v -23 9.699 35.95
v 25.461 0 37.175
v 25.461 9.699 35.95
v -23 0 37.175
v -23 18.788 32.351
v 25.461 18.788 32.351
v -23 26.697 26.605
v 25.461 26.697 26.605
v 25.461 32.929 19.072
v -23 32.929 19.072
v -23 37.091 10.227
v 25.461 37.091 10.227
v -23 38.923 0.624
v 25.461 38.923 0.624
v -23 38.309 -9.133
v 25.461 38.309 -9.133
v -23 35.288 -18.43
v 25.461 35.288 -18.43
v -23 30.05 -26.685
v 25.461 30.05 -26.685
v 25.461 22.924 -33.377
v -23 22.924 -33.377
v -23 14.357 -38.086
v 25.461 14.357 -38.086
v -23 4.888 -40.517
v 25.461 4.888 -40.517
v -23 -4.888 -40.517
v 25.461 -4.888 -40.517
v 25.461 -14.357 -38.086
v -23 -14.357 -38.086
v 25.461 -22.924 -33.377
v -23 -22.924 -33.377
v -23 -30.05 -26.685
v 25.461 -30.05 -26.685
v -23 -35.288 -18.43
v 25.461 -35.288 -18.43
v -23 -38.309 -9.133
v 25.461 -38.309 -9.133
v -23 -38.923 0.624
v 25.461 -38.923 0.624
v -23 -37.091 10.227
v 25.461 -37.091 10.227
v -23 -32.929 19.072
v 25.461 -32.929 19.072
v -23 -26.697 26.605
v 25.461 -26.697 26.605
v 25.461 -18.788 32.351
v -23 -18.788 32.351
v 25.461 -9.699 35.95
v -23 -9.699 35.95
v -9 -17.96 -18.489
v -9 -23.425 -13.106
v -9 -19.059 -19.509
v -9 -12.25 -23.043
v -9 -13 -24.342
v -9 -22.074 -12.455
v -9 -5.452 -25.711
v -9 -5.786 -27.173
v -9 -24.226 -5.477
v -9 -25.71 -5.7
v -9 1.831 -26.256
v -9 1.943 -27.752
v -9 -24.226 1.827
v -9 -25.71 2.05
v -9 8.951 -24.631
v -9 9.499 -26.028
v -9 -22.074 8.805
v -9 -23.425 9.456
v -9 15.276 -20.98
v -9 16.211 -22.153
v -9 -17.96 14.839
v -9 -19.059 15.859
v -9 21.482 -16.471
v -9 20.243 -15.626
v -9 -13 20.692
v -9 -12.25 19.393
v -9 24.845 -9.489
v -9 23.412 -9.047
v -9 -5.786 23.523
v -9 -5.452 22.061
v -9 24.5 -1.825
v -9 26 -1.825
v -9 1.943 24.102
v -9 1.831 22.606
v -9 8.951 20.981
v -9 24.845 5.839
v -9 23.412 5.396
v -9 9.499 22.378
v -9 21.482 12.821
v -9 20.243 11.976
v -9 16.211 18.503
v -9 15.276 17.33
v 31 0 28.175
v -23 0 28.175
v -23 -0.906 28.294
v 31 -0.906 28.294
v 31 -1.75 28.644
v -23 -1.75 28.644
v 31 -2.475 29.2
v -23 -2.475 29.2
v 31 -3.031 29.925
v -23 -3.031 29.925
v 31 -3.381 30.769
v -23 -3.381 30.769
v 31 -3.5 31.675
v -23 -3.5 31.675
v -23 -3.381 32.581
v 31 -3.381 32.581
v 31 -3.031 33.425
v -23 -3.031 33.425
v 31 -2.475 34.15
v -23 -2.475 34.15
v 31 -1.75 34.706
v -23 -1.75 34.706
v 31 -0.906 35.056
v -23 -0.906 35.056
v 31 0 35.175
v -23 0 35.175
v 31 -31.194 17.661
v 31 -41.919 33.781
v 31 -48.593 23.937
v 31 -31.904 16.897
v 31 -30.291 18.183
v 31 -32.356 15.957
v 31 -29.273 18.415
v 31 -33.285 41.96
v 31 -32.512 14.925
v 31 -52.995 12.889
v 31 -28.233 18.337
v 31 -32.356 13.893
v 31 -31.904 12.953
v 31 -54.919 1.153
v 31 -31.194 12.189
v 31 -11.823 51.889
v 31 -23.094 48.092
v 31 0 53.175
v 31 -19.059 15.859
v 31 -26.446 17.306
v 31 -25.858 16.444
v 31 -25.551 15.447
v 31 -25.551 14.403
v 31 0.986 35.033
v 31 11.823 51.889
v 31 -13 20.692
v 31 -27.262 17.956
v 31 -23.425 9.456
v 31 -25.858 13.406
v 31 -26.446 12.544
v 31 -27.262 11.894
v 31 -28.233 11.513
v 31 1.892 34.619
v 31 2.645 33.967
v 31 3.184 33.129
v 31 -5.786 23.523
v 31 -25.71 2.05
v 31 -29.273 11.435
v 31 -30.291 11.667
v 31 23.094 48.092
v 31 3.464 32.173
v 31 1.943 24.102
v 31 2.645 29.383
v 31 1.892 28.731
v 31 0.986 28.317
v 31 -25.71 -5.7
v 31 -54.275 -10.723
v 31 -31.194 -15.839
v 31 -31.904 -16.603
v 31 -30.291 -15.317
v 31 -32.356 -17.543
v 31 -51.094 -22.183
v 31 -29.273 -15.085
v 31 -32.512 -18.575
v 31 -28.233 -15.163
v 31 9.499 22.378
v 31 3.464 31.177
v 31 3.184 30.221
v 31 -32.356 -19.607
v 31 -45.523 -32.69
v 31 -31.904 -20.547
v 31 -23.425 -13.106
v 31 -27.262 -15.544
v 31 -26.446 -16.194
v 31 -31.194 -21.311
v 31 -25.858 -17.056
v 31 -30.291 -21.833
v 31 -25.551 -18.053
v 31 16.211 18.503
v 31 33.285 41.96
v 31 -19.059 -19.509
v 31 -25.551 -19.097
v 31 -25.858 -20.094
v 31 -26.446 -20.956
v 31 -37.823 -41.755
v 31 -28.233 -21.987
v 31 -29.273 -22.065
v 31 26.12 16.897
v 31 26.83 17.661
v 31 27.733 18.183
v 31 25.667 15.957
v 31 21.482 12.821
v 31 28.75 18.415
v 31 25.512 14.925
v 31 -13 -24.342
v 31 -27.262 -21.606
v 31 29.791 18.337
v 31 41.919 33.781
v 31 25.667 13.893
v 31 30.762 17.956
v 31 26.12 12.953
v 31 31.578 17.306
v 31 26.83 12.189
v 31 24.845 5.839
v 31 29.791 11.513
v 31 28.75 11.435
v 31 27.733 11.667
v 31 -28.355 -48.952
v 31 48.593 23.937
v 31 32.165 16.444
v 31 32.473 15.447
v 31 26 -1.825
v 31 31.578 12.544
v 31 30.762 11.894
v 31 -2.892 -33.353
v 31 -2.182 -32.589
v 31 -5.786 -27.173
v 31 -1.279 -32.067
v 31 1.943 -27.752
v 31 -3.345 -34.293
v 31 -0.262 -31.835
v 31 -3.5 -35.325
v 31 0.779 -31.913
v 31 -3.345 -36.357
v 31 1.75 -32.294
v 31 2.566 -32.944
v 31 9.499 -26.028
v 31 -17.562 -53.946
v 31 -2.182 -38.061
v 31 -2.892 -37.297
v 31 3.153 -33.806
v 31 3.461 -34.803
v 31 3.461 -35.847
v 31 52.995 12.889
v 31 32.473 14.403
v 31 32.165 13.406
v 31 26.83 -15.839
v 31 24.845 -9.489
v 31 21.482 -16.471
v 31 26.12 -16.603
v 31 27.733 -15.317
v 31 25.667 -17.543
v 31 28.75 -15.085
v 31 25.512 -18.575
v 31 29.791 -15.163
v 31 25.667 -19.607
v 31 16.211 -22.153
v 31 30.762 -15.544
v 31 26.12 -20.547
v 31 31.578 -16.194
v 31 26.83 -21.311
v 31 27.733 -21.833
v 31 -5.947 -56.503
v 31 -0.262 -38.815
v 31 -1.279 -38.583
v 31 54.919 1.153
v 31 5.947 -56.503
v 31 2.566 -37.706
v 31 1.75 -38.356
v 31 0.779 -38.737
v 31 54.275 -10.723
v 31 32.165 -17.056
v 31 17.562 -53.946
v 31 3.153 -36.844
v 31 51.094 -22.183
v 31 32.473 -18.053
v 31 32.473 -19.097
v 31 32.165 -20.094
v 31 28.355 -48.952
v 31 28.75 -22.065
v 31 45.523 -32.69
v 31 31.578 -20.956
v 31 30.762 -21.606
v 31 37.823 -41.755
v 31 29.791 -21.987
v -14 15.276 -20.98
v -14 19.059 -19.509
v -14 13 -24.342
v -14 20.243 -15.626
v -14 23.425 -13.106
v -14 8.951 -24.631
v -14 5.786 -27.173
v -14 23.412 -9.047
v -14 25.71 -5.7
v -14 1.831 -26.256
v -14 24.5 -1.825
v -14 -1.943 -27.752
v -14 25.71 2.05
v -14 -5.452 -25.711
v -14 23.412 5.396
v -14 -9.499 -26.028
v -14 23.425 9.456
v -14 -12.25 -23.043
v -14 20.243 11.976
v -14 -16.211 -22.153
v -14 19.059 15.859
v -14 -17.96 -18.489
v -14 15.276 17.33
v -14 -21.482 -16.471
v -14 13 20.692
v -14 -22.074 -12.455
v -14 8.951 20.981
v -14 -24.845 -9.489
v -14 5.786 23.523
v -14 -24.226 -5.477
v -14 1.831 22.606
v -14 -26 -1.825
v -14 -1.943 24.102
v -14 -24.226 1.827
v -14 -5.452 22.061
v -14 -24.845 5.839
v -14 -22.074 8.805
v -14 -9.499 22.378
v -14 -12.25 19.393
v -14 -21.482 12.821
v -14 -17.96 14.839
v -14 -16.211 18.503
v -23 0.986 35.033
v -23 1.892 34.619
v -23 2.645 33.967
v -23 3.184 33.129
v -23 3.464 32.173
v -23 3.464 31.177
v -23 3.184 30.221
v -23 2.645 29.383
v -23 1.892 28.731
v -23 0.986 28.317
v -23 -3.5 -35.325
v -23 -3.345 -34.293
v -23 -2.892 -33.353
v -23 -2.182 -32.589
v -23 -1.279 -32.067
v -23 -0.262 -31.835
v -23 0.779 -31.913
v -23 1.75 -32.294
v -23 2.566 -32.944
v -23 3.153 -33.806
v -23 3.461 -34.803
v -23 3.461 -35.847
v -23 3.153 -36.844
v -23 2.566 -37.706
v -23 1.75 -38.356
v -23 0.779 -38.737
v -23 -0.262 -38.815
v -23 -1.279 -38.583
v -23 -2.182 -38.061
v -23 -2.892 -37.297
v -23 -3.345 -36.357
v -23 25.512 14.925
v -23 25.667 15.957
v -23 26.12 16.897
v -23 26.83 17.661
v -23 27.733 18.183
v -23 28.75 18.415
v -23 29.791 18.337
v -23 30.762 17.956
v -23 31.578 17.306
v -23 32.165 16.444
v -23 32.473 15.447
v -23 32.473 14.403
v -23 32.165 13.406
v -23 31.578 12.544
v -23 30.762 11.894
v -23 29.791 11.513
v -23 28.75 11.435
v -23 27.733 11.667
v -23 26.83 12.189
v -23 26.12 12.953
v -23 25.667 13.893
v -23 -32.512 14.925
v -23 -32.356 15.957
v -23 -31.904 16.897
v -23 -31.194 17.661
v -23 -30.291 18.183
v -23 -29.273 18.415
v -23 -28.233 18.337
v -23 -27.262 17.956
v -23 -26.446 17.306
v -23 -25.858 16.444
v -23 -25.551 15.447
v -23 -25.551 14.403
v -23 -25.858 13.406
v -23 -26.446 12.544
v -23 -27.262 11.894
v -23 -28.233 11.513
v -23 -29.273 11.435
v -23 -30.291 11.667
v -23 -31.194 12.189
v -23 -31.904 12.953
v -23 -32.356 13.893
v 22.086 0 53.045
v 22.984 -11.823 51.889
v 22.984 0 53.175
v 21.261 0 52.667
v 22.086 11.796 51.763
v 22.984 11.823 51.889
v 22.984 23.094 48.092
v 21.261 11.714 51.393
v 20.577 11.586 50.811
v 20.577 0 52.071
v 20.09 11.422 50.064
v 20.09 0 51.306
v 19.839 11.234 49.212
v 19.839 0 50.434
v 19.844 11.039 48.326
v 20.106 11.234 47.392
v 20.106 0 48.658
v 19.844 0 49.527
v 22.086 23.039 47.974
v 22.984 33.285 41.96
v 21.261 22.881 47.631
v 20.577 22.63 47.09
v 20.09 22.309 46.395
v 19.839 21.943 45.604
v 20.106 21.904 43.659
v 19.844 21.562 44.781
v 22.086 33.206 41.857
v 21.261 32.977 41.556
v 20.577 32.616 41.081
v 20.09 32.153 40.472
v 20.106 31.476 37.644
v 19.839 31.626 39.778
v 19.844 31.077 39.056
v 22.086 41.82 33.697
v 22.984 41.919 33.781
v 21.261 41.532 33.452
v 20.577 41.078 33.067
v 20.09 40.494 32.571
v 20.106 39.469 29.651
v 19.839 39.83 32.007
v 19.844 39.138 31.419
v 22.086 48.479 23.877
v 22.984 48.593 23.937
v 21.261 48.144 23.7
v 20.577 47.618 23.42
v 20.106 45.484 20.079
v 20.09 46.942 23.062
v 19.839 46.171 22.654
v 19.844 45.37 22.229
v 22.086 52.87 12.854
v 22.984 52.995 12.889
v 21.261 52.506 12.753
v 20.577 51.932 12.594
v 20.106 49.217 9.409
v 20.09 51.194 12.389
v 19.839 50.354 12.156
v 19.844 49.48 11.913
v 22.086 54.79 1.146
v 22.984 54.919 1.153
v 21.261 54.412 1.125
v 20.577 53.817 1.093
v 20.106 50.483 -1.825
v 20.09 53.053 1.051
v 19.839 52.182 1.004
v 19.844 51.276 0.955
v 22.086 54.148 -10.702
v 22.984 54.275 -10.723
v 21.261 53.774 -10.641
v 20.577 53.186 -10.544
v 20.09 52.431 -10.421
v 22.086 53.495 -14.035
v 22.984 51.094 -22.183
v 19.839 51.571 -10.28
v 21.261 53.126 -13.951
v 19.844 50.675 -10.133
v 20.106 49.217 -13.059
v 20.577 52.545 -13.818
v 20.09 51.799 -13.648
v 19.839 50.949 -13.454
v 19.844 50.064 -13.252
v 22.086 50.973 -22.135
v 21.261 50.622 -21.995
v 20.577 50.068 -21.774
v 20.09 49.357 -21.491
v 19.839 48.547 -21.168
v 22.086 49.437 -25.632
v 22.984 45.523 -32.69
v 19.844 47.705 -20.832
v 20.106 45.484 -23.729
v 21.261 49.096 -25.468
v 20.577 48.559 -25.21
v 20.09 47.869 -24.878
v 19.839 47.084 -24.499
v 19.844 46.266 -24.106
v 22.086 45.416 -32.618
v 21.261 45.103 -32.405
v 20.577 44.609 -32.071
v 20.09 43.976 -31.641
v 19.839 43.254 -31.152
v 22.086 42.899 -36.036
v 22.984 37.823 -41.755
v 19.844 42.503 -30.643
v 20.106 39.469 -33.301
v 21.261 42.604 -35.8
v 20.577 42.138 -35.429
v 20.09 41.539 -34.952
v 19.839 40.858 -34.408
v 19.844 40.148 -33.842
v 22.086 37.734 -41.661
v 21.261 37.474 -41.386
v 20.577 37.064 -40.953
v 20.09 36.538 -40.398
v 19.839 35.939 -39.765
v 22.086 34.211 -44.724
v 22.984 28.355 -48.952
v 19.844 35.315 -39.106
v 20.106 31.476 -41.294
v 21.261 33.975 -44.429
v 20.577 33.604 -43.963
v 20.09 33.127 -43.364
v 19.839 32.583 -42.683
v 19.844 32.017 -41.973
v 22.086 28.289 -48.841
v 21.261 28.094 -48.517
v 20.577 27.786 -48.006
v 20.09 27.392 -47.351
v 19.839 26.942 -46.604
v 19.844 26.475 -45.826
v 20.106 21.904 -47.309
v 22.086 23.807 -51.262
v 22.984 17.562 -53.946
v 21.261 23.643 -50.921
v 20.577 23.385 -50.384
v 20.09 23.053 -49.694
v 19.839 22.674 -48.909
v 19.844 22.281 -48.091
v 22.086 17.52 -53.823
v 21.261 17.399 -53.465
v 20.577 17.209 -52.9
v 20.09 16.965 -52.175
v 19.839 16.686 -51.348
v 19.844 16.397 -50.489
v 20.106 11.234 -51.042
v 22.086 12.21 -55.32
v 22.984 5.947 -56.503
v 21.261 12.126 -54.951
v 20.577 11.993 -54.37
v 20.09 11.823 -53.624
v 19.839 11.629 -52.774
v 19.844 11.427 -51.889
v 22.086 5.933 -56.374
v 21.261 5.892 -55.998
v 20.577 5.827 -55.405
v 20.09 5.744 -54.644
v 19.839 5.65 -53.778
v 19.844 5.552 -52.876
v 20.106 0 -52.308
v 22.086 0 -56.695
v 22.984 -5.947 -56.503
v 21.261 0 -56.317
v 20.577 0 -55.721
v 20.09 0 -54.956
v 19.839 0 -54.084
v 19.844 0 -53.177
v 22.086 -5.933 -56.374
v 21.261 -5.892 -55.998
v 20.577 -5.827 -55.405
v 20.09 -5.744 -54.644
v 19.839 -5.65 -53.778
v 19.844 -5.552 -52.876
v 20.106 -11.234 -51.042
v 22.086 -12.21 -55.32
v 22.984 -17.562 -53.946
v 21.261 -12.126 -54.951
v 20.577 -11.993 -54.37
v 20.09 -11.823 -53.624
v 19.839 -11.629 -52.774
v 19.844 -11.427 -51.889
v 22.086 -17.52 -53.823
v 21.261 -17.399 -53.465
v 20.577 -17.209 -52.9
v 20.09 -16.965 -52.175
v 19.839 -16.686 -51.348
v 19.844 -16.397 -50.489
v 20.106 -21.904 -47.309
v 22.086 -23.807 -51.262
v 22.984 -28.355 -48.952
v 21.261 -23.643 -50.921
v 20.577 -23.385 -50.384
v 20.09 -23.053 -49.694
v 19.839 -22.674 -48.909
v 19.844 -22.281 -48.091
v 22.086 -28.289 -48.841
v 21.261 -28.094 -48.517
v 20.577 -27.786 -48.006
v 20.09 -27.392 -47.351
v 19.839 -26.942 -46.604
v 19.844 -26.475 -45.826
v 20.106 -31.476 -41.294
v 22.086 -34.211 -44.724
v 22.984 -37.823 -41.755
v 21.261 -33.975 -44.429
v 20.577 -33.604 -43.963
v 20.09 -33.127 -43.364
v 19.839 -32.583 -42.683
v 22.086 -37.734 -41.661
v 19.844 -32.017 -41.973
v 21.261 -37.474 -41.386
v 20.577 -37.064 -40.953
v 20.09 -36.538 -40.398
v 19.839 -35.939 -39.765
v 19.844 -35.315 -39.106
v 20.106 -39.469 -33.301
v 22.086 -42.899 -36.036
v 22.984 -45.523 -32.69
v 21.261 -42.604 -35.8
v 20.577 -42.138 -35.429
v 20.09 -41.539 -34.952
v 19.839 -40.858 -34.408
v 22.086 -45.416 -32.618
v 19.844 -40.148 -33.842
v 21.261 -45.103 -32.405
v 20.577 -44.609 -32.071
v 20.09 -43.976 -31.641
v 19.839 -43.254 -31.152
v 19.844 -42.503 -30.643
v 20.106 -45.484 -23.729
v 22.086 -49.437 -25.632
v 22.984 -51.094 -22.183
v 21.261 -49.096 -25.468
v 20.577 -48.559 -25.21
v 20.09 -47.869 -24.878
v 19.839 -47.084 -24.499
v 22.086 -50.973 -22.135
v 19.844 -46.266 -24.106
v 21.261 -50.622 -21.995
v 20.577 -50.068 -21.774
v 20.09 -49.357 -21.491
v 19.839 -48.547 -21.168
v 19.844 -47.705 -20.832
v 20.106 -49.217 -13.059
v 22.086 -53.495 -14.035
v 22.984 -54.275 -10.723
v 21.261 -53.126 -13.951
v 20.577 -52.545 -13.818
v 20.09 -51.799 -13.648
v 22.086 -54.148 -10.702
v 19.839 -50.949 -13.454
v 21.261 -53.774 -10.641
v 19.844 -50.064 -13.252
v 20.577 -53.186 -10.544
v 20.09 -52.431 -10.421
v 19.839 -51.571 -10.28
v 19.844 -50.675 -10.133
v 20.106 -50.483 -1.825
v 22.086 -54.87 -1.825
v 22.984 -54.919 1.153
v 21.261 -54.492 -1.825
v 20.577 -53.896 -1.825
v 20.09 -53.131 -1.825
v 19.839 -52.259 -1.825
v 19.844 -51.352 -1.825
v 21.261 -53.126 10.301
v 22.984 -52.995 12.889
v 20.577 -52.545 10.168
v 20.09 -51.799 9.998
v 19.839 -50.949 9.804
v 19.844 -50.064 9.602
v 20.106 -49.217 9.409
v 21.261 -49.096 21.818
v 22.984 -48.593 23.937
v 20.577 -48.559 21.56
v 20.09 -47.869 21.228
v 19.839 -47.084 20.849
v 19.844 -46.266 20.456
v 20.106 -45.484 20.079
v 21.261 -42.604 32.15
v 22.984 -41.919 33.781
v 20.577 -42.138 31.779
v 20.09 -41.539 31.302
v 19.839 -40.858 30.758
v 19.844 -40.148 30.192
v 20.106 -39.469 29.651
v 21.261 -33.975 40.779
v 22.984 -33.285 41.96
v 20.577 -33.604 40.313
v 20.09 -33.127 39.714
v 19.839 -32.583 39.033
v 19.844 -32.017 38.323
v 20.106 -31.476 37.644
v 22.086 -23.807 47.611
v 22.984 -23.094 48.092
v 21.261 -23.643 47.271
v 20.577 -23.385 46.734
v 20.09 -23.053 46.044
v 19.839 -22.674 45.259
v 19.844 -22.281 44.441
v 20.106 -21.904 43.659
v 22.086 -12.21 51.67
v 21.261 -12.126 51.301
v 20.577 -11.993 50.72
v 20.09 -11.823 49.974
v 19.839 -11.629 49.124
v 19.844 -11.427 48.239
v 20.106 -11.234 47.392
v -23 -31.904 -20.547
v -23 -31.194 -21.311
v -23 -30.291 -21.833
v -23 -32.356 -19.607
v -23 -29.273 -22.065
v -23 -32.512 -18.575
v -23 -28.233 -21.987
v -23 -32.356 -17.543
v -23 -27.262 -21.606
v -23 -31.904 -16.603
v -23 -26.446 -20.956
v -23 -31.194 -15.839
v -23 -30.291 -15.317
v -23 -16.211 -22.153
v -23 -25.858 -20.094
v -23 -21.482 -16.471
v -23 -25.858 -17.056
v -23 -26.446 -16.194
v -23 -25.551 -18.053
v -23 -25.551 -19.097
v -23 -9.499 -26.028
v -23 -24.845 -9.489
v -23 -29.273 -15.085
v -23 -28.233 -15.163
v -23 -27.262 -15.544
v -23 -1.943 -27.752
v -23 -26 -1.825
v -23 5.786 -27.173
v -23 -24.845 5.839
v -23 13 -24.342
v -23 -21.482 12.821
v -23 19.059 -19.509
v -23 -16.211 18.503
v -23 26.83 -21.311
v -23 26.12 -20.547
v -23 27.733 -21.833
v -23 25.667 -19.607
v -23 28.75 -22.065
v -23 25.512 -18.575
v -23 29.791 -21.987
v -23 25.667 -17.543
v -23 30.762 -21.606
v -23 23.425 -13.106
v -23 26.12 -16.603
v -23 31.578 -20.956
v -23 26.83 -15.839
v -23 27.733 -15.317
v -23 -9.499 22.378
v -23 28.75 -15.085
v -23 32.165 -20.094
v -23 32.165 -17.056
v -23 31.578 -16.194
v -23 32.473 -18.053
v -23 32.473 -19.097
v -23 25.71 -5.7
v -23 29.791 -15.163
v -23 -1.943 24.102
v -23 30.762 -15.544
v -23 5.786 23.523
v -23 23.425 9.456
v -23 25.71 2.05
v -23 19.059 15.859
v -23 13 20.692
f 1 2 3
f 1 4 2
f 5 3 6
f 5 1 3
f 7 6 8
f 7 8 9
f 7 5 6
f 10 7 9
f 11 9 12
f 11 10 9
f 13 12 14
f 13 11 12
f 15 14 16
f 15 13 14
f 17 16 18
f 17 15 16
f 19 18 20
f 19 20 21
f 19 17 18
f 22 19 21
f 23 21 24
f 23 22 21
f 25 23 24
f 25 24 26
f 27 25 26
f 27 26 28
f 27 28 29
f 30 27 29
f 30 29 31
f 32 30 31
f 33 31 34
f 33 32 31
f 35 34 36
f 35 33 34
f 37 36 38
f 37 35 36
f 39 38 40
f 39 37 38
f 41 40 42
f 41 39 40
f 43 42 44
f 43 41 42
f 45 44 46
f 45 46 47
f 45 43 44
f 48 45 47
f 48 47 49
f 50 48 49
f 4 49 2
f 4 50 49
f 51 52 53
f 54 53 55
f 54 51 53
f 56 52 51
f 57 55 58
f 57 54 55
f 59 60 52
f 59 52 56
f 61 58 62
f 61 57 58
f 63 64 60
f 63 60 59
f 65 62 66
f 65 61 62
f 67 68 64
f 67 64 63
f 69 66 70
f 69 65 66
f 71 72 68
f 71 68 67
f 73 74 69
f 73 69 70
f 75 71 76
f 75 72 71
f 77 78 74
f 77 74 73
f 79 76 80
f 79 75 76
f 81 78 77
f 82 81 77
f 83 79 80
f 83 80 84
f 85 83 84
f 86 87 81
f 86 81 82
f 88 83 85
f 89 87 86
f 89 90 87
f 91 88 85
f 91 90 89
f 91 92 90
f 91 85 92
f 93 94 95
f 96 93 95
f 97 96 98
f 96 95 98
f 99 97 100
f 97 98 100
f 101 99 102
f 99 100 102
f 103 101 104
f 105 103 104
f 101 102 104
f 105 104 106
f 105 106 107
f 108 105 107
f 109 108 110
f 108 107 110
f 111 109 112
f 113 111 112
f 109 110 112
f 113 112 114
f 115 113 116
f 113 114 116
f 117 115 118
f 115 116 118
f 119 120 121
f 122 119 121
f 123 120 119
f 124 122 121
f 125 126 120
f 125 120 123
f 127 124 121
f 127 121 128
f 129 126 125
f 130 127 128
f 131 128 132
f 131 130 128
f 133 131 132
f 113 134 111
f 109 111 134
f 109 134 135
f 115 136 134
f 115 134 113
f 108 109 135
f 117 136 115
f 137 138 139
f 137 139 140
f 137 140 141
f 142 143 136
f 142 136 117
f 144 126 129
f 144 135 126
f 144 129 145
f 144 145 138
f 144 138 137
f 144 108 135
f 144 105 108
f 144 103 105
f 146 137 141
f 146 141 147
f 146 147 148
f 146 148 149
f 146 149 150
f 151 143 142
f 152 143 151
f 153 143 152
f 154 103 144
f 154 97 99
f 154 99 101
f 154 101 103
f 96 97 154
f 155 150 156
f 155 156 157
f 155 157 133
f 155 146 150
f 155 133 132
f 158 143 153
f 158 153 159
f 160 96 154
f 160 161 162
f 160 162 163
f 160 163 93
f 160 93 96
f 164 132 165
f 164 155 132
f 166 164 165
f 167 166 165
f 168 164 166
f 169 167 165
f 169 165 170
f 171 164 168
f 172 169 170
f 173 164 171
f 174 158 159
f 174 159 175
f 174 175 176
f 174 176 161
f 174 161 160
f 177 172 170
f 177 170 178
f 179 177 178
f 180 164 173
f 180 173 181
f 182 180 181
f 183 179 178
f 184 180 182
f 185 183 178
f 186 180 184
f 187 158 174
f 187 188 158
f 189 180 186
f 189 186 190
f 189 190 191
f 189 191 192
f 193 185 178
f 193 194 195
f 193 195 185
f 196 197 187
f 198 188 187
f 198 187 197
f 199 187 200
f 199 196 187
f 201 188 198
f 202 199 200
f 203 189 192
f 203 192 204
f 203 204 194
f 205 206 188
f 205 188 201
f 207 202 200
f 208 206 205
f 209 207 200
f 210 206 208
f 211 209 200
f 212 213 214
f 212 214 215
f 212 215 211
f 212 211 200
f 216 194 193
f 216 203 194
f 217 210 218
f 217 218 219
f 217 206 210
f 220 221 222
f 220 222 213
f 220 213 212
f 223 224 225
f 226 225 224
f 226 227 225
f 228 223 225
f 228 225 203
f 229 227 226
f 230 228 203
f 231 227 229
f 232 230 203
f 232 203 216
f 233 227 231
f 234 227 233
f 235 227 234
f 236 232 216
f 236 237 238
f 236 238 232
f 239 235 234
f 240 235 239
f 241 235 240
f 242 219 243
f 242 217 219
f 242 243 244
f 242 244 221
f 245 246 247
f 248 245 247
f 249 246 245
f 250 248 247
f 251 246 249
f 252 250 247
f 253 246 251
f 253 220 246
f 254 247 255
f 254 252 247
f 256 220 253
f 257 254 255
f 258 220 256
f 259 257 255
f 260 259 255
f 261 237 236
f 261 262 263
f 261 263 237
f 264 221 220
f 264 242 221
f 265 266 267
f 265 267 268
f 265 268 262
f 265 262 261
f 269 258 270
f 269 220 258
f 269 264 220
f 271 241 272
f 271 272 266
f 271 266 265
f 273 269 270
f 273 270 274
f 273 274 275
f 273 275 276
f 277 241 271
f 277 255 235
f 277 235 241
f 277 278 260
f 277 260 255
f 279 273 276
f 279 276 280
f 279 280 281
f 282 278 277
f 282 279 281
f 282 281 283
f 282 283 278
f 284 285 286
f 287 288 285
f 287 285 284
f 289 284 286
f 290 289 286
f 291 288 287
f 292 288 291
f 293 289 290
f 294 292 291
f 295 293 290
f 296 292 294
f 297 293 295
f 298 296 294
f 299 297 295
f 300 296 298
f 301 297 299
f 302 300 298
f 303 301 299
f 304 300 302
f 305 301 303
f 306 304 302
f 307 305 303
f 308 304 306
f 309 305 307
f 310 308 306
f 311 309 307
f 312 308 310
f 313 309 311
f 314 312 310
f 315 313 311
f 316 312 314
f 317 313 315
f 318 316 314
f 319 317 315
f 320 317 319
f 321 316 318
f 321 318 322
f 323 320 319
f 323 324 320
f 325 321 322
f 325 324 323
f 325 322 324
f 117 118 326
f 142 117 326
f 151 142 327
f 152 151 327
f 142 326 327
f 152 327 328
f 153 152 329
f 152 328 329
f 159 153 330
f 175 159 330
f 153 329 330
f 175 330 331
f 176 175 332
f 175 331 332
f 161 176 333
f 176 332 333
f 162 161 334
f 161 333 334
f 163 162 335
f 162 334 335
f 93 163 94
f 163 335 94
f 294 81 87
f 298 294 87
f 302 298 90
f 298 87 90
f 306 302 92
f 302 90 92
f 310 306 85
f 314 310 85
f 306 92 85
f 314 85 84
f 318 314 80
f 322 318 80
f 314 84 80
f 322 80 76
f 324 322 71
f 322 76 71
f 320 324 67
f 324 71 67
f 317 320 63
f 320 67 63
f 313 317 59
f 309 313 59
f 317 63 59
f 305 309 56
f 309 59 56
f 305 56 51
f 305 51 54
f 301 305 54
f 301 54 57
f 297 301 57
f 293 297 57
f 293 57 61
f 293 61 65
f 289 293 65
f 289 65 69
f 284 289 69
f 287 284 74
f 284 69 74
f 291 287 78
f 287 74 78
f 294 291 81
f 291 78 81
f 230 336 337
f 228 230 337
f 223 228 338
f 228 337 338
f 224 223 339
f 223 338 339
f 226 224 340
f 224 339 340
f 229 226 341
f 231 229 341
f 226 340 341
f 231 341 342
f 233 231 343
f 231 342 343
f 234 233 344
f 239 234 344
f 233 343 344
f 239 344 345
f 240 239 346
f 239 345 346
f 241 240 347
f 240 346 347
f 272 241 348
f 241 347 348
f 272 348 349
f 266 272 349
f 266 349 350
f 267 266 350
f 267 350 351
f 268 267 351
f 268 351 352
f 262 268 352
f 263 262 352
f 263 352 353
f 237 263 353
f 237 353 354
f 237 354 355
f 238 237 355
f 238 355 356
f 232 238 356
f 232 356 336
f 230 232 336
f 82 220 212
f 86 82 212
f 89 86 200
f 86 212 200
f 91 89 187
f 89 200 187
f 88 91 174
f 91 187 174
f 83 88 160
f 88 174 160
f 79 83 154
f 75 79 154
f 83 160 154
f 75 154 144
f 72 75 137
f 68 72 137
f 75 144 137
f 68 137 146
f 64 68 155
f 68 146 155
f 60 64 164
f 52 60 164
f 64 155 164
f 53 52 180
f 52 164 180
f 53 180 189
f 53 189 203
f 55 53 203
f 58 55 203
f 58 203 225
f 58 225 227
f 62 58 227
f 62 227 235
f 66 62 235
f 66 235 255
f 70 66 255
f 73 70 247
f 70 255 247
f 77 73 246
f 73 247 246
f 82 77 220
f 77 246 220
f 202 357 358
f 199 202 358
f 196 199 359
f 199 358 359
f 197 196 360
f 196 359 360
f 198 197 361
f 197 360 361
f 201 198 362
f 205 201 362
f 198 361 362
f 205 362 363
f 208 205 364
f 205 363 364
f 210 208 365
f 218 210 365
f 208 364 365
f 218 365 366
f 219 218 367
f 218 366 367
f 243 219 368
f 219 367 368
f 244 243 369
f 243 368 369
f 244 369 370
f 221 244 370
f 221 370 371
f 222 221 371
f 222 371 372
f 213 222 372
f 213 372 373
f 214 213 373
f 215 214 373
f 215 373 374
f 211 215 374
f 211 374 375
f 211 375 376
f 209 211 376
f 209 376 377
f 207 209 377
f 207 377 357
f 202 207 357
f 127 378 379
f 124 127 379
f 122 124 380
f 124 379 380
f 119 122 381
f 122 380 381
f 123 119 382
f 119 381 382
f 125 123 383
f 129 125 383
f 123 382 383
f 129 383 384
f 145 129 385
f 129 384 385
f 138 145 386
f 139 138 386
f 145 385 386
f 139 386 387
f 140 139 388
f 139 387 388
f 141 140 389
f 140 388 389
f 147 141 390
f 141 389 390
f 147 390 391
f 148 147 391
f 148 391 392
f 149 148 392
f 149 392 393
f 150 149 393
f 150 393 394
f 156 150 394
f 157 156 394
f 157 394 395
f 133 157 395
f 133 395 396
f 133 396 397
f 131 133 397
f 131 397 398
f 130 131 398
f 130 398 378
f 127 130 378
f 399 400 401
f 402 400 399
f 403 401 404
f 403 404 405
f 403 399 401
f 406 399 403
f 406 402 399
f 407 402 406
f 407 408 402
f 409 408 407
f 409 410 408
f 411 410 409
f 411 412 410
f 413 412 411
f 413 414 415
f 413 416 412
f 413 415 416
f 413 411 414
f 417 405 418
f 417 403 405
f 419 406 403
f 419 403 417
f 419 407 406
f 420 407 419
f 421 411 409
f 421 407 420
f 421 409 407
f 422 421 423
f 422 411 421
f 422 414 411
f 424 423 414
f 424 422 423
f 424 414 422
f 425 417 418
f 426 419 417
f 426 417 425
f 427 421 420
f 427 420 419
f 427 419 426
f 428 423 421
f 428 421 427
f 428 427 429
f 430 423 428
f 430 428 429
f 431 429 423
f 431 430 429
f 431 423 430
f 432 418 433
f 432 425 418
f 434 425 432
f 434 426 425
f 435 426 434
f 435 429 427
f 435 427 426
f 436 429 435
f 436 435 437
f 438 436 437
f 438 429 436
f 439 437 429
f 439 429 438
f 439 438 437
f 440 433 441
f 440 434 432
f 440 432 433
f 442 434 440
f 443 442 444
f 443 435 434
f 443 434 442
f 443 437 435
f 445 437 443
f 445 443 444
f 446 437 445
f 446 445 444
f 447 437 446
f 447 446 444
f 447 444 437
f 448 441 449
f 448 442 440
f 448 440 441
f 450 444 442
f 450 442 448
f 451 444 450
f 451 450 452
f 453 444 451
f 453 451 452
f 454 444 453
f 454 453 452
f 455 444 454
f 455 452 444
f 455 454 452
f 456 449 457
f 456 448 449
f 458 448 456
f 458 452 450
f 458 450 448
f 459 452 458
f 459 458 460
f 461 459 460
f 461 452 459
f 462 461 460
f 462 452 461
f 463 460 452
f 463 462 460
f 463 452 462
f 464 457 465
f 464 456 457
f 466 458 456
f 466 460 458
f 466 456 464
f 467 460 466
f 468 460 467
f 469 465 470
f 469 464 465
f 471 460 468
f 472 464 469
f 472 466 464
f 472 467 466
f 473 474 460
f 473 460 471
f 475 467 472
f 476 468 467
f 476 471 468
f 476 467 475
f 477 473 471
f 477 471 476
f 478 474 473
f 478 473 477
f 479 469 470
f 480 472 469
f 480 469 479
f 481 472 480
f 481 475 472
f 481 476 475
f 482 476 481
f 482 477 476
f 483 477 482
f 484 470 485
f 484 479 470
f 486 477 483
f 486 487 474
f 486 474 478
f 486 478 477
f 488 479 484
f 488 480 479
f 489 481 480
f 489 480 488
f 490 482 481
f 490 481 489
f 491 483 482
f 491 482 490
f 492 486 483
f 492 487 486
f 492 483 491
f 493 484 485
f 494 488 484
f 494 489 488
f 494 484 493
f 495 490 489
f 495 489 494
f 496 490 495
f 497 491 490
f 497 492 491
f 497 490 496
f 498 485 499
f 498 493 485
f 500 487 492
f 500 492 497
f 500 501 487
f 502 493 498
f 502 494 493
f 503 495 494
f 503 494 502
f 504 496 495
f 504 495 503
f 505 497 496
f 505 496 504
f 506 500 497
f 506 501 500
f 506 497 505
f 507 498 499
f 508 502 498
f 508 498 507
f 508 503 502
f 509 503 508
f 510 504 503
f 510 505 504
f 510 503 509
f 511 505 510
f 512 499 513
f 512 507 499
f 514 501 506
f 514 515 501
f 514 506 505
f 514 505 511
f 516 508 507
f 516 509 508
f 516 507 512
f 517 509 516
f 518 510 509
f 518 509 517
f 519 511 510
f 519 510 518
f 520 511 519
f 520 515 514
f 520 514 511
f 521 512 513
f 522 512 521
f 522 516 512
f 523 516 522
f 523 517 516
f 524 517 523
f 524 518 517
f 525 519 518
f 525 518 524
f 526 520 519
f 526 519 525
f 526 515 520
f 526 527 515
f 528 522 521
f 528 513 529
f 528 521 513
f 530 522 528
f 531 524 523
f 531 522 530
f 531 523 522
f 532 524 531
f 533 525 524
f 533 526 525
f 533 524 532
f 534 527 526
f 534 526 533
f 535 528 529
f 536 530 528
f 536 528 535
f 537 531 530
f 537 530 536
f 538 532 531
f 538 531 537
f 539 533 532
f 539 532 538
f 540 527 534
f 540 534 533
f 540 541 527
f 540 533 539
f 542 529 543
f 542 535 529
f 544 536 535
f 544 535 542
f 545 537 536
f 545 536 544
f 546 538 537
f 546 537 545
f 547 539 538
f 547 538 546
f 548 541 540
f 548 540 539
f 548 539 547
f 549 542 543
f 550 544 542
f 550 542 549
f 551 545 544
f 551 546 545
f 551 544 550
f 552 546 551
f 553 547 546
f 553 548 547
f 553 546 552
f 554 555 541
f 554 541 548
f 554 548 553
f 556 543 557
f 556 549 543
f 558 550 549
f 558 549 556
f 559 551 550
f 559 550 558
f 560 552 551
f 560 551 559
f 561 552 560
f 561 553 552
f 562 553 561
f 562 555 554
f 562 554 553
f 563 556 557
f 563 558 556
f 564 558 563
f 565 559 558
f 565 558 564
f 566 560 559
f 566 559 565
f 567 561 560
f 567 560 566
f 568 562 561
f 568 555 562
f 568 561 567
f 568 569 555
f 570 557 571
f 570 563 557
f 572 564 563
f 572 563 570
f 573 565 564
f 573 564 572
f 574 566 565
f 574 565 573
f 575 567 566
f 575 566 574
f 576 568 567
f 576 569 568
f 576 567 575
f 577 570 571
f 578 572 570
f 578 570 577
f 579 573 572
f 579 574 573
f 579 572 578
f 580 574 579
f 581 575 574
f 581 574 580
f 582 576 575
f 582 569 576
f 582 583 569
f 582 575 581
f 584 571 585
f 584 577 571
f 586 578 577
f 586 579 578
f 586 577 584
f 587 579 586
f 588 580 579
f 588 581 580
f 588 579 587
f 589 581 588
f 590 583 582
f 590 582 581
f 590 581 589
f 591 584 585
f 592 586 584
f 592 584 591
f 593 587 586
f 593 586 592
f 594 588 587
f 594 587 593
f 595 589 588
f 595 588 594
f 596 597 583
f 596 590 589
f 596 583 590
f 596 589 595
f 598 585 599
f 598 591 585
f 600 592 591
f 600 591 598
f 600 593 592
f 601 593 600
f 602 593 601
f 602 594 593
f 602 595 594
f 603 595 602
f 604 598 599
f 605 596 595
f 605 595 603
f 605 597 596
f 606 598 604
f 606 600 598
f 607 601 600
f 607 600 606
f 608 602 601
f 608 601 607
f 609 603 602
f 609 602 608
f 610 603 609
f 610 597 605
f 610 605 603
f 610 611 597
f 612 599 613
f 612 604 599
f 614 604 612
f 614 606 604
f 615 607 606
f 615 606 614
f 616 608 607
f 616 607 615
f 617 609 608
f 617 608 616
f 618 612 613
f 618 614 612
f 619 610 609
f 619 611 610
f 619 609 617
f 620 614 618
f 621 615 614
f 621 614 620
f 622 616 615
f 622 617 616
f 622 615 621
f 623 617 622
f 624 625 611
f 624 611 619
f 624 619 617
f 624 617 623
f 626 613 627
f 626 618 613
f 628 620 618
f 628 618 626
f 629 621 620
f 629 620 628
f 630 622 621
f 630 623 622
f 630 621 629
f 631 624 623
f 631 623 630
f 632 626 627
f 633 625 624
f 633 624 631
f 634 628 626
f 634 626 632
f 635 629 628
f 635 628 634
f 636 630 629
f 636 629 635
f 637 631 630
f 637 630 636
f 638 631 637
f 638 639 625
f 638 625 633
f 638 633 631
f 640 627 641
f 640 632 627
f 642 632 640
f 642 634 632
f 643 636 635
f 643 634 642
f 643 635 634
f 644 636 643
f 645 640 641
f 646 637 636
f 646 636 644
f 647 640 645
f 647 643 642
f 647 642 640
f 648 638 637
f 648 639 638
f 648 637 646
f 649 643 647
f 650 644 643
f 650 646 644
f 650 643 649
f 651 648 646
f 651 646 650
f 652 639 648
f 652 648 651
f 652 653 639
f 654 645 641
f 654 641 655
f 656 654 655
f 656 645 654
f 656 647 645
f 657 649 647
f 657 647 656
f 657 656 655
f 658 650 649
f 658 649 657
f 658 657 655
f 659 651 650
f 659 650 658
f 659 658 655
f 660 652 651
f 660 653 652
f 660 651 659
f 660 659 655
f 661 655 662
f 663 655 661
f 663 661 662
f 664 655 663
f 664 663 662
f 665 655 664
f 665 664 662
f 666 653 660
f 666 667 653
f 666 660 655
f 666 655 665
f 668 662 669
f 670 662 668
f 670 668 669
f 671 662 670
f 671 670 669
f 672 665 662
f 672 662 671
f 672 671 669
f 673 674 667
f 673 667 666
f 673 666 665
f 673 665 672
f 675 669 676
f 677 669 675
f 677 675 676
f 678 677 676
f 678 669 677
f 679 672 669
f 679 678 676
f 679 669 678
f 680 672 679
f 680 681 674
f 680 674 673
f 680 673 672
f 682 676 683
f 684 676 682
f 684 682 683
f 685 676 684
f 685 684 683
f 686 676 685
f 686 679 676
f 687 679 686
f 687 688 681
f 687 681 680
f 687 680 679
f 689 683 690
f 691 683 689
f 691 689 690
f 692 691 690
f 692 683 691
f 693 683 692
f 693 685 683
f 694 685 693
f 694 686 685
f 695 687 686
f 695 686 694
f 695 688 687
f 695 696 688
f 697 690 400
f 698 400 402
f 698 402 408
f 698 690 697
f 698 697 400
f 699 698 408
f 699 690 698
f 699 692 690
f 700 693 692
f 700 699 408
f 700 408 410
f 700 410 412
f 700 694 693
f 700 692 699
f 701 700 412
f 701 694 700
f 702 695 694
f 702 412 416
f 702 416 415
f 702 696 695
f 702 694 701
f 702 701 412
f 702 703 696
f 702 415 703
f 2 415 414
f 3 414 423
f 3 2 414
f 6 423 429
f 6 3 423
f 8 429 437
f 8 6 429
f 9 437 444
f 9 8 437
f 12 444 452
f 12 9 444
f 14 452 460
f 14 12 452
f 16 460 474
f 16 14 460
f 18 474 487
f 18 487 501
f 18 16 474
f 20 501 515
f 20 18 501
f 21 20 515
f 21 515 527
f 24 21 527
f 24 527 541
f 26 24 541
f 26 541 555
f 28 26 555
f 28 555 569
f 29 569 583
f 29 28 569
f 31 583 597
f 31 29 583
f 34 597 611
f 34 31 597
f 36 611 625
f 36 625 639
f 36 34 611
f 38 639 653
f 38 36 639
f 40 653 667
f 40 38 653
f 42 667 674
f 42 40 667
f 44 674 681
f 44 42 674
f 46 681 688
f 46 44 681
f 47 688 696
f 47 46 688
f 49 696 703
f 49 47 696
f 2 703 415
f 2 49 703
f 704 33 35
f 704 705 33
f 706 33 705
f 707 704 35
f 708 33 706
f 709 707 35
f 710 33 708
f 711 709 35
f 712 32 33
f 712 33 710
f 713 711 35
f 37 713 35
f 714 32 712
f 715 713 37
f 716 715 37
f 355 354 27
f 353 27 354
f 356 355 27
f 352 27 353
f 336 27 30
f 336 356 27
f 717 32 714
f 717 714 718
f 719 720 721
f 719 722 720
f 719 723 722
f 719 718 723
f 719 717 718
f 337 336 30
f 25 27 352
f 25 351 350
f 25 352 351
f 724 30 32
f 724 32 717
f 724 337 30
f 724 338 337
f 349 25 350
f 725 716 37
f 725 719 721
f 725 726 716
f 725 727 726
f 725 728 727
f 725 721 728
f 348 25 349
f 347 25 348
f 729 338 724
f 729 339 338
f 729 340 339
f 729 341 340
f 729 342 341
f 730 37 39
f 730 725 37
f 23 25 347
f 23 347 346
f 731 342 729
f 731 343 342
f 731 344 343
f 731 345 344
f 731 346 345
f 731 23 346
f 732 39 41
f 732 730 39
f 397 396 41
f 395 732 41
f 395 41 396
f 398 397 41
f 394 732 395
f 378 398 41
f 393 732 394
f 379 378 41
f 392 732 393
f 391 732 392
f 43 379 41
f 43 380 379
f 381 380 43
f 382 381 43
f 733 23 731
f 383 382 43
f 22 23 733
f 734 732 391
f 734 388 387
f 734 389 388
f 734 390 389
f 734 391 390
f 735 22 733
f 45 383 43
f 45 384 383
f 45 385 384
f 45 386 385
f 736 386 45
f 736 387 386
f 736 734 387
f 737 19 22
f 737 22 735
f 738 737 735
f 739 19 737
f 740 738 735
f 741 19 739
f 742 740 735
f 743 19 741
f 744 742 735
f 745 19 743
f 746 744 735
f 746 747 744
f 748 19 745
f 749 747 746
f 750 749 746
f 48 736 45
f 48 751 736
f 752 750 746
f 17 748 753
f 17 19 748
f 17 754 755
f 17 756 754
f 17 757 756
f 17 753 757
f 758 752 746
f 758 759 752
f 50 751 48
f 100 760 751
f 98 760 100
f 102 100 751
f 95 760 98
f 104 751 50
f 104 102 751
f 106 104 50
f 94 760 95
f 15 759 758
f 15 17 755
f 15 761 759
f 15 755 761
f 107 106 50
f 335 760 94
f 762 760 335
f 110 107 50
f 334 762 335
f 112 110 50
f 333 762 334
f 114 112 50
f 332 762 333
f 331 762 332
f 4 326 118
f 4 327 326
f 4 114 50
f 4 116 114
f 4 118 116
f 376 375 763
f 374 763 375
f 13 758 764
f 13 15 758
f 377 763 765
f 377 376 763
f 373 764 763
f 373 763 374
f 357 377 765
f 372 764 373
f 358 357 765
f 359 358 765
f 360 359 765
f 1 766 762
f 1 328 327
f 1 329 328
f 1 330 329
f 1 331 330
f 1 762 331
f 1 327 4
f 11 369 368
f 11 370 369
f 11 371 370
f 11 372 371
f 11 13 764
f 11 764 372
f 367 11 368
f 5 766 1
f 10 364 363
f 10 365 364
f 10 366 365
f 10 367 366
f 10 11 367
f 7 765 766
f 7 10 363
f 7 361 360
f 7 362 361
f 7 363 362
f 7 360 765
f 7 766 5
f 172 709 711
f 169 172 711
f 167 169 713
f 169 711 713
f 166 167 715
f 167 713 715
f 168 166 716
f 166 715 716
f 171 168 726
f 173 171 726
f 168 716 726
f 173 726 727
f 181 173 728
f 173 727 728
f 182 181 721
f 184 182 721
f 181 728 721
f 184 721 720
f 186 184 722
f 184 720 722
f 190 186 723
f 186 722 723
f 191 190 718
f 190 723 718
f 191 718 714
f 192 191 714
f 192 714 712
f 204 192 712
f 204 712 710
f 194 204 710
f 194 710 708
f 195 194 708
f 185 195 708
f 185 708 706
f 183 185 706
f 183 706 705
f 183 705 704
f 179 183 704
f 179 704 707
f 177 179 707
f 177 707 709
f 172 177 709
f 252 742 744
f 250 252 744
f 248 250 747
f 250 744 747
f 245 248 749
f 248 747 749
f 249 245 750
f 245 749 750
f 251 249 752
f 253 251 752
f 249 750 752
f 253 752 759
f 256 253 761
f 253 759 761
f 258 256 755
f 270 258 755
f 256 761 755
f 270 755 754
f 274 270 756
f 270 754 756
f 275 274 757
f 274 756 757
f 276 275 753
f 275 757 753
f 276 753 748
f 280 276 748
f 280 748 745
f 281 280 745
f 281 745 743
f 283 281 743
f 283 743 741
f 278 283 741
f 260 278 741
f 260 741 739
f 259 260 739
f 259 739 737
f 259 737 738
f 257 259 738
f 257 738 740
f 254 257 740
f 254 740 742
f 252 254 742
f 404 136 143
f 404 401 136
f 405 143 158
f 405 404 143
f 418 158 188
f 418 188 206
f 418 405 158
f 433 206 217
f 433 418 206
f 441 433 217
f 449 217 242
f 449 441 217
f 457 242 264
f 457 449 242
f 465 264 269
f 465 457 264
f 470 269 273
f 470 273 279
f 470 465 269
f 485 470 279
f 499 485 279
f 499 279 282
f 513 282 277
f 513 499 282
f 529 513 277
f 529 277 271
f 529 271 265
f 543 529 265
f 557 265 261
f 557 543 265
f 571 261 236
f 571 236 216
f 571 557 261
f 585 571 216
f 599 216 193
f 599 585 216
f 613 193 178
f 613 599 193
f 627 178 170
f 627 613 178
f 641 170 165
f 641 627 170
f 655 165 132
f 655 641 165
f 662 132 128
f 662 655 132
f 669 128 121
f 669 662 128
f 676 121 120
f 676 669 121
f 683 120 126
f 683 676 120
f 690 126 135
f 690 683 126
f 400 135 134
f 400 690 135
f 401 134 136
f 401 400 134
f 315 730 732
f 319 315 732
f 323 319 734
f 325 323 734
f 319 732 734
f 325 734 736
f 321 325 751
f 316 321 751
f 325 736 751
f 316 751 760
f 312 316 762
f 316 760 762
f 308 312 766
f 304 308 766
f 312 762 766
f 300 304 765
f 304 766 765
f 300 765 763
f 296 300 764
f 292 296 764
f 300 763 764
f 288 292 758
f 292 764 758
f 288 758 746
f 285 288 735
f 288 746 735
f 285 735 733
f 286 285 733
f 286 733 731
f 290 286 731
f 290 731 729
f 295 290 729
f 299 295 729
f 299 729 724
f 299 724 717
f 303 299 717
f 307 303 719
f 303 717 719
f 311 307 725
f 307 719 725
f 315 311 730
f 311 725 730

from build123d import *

# Parameters (mm, degrees)
F2_R     = 26
F3_DEPTH = 40
F4_R     = 24.5
F5_DEPTH = 5
F6_R     = 26
F7_DEPTH = 9
F8_R     = 3.5
F9_DEPTH = 54.001


with BuildPart() as f1:
    # F0 (on Front) → F1 (revolve)
    with BuildSketch(Plane.XZ):
        with BuildLine():
            Line((31, 53.175), (22.9837517073, 53.175))
            ThreePointArc((22.9837517073, 53.175), (20.3059838669, 51.7059262565), (20.1062244835, 48.658187019))
            Line((20.1062244835, 48.658187019), (25.4609225305, 37.175))
            Line((25.4609225305, 37.175), (-23, 37.175))
            Line((-23, 37.175), (-23, -1.8250067694))
            Line((-23, -1.8250067694), (31, -1.8250067694))
            Line((31, -1.8250067694), (31, 37.175))
            Line((31, 37.175), (31, 53.175))
        make_face()
    revolve(axis=Axis((4, 0, -1.8250067694), (-1, 0, 0)))

    # F2 (on face) → F3 (cut)
    with BuildSketch(Plane.YZ.offset(31)):
        with Locations((0, -1.8250067694)):
            Circle(F2_R)
    extrude(amount=-F3_DEPTH, mode=Mode.SUBTRACT)

    # F4 (on face) → F5 (cut)
    with BuildSketch(Plane.YZ.offset(-9)):
        with Locations((0, -1.8250067694)):
            Circle(F4_R)
    extrude(amount=-F5_DEPTH, mode=Mode.SUBTRACT)

    # F6 (on face) → F7 (cut)
    with BuildSketch(Plane(origin=(-23, 0, 0), x_dir=(0, -1, 0), z_dir=(-1, 0, 0))):
        with Locations((0, -1.8250067694)):
            Circle(F6_R)
    extrude(amount=-F7_DEPTH, mode=Mode.SUBTRACT)

    # F8 (on face) → F9 (cut, through all)
    with BuildSketch(Plane(origin=(-23, 0, 0), x_dir=(0, -1, 0), z_dir=(-1, 0, 0))):
        with Locations((-29.0118510268, 14.9249932306)):
            Circle(F8_R)
        with Locations((-29.0118510268, -18.5750067694)):
            Circle(F8_R)
        with Locations((0, -35.3250067694)):
            Circle(F8_R)
        with Locations((29.0118510268, -18.5750067694)):
            Circle(F8_R)
        with Locations((29.0118510268, 14.9249932306)):
            Circle(F8_R)
        with BuildLine():
            Line((0, 31.6749932306), (0, 35.1749932306))
            ThreePointArc((0, 35.1749932306), (-3.5, 31.6749932306), (0, 28.1749932306))
            Line((0, 28.1749932306), (0, 31.6749932306))
        make_face()
        with BuildLine():
            ThreePointArc((0, 28.1749932306), (2.4748737342, 29.2001194964), (3.5, 31.6749932306))
            ThreePointArc((3.5, 31.6749932306), (2.4748737342, 34.1498669647), (0, 35.1749932306))
            Line((0, 35.1749932306), (0, 31.6749932306))
            Line((0, 31.6749932306), (0, 28.1749932306))
        make_face()
    extrude(amount=-F9_DEPTH, mode=Mode.SUBTRACT)


solid = f1.part
